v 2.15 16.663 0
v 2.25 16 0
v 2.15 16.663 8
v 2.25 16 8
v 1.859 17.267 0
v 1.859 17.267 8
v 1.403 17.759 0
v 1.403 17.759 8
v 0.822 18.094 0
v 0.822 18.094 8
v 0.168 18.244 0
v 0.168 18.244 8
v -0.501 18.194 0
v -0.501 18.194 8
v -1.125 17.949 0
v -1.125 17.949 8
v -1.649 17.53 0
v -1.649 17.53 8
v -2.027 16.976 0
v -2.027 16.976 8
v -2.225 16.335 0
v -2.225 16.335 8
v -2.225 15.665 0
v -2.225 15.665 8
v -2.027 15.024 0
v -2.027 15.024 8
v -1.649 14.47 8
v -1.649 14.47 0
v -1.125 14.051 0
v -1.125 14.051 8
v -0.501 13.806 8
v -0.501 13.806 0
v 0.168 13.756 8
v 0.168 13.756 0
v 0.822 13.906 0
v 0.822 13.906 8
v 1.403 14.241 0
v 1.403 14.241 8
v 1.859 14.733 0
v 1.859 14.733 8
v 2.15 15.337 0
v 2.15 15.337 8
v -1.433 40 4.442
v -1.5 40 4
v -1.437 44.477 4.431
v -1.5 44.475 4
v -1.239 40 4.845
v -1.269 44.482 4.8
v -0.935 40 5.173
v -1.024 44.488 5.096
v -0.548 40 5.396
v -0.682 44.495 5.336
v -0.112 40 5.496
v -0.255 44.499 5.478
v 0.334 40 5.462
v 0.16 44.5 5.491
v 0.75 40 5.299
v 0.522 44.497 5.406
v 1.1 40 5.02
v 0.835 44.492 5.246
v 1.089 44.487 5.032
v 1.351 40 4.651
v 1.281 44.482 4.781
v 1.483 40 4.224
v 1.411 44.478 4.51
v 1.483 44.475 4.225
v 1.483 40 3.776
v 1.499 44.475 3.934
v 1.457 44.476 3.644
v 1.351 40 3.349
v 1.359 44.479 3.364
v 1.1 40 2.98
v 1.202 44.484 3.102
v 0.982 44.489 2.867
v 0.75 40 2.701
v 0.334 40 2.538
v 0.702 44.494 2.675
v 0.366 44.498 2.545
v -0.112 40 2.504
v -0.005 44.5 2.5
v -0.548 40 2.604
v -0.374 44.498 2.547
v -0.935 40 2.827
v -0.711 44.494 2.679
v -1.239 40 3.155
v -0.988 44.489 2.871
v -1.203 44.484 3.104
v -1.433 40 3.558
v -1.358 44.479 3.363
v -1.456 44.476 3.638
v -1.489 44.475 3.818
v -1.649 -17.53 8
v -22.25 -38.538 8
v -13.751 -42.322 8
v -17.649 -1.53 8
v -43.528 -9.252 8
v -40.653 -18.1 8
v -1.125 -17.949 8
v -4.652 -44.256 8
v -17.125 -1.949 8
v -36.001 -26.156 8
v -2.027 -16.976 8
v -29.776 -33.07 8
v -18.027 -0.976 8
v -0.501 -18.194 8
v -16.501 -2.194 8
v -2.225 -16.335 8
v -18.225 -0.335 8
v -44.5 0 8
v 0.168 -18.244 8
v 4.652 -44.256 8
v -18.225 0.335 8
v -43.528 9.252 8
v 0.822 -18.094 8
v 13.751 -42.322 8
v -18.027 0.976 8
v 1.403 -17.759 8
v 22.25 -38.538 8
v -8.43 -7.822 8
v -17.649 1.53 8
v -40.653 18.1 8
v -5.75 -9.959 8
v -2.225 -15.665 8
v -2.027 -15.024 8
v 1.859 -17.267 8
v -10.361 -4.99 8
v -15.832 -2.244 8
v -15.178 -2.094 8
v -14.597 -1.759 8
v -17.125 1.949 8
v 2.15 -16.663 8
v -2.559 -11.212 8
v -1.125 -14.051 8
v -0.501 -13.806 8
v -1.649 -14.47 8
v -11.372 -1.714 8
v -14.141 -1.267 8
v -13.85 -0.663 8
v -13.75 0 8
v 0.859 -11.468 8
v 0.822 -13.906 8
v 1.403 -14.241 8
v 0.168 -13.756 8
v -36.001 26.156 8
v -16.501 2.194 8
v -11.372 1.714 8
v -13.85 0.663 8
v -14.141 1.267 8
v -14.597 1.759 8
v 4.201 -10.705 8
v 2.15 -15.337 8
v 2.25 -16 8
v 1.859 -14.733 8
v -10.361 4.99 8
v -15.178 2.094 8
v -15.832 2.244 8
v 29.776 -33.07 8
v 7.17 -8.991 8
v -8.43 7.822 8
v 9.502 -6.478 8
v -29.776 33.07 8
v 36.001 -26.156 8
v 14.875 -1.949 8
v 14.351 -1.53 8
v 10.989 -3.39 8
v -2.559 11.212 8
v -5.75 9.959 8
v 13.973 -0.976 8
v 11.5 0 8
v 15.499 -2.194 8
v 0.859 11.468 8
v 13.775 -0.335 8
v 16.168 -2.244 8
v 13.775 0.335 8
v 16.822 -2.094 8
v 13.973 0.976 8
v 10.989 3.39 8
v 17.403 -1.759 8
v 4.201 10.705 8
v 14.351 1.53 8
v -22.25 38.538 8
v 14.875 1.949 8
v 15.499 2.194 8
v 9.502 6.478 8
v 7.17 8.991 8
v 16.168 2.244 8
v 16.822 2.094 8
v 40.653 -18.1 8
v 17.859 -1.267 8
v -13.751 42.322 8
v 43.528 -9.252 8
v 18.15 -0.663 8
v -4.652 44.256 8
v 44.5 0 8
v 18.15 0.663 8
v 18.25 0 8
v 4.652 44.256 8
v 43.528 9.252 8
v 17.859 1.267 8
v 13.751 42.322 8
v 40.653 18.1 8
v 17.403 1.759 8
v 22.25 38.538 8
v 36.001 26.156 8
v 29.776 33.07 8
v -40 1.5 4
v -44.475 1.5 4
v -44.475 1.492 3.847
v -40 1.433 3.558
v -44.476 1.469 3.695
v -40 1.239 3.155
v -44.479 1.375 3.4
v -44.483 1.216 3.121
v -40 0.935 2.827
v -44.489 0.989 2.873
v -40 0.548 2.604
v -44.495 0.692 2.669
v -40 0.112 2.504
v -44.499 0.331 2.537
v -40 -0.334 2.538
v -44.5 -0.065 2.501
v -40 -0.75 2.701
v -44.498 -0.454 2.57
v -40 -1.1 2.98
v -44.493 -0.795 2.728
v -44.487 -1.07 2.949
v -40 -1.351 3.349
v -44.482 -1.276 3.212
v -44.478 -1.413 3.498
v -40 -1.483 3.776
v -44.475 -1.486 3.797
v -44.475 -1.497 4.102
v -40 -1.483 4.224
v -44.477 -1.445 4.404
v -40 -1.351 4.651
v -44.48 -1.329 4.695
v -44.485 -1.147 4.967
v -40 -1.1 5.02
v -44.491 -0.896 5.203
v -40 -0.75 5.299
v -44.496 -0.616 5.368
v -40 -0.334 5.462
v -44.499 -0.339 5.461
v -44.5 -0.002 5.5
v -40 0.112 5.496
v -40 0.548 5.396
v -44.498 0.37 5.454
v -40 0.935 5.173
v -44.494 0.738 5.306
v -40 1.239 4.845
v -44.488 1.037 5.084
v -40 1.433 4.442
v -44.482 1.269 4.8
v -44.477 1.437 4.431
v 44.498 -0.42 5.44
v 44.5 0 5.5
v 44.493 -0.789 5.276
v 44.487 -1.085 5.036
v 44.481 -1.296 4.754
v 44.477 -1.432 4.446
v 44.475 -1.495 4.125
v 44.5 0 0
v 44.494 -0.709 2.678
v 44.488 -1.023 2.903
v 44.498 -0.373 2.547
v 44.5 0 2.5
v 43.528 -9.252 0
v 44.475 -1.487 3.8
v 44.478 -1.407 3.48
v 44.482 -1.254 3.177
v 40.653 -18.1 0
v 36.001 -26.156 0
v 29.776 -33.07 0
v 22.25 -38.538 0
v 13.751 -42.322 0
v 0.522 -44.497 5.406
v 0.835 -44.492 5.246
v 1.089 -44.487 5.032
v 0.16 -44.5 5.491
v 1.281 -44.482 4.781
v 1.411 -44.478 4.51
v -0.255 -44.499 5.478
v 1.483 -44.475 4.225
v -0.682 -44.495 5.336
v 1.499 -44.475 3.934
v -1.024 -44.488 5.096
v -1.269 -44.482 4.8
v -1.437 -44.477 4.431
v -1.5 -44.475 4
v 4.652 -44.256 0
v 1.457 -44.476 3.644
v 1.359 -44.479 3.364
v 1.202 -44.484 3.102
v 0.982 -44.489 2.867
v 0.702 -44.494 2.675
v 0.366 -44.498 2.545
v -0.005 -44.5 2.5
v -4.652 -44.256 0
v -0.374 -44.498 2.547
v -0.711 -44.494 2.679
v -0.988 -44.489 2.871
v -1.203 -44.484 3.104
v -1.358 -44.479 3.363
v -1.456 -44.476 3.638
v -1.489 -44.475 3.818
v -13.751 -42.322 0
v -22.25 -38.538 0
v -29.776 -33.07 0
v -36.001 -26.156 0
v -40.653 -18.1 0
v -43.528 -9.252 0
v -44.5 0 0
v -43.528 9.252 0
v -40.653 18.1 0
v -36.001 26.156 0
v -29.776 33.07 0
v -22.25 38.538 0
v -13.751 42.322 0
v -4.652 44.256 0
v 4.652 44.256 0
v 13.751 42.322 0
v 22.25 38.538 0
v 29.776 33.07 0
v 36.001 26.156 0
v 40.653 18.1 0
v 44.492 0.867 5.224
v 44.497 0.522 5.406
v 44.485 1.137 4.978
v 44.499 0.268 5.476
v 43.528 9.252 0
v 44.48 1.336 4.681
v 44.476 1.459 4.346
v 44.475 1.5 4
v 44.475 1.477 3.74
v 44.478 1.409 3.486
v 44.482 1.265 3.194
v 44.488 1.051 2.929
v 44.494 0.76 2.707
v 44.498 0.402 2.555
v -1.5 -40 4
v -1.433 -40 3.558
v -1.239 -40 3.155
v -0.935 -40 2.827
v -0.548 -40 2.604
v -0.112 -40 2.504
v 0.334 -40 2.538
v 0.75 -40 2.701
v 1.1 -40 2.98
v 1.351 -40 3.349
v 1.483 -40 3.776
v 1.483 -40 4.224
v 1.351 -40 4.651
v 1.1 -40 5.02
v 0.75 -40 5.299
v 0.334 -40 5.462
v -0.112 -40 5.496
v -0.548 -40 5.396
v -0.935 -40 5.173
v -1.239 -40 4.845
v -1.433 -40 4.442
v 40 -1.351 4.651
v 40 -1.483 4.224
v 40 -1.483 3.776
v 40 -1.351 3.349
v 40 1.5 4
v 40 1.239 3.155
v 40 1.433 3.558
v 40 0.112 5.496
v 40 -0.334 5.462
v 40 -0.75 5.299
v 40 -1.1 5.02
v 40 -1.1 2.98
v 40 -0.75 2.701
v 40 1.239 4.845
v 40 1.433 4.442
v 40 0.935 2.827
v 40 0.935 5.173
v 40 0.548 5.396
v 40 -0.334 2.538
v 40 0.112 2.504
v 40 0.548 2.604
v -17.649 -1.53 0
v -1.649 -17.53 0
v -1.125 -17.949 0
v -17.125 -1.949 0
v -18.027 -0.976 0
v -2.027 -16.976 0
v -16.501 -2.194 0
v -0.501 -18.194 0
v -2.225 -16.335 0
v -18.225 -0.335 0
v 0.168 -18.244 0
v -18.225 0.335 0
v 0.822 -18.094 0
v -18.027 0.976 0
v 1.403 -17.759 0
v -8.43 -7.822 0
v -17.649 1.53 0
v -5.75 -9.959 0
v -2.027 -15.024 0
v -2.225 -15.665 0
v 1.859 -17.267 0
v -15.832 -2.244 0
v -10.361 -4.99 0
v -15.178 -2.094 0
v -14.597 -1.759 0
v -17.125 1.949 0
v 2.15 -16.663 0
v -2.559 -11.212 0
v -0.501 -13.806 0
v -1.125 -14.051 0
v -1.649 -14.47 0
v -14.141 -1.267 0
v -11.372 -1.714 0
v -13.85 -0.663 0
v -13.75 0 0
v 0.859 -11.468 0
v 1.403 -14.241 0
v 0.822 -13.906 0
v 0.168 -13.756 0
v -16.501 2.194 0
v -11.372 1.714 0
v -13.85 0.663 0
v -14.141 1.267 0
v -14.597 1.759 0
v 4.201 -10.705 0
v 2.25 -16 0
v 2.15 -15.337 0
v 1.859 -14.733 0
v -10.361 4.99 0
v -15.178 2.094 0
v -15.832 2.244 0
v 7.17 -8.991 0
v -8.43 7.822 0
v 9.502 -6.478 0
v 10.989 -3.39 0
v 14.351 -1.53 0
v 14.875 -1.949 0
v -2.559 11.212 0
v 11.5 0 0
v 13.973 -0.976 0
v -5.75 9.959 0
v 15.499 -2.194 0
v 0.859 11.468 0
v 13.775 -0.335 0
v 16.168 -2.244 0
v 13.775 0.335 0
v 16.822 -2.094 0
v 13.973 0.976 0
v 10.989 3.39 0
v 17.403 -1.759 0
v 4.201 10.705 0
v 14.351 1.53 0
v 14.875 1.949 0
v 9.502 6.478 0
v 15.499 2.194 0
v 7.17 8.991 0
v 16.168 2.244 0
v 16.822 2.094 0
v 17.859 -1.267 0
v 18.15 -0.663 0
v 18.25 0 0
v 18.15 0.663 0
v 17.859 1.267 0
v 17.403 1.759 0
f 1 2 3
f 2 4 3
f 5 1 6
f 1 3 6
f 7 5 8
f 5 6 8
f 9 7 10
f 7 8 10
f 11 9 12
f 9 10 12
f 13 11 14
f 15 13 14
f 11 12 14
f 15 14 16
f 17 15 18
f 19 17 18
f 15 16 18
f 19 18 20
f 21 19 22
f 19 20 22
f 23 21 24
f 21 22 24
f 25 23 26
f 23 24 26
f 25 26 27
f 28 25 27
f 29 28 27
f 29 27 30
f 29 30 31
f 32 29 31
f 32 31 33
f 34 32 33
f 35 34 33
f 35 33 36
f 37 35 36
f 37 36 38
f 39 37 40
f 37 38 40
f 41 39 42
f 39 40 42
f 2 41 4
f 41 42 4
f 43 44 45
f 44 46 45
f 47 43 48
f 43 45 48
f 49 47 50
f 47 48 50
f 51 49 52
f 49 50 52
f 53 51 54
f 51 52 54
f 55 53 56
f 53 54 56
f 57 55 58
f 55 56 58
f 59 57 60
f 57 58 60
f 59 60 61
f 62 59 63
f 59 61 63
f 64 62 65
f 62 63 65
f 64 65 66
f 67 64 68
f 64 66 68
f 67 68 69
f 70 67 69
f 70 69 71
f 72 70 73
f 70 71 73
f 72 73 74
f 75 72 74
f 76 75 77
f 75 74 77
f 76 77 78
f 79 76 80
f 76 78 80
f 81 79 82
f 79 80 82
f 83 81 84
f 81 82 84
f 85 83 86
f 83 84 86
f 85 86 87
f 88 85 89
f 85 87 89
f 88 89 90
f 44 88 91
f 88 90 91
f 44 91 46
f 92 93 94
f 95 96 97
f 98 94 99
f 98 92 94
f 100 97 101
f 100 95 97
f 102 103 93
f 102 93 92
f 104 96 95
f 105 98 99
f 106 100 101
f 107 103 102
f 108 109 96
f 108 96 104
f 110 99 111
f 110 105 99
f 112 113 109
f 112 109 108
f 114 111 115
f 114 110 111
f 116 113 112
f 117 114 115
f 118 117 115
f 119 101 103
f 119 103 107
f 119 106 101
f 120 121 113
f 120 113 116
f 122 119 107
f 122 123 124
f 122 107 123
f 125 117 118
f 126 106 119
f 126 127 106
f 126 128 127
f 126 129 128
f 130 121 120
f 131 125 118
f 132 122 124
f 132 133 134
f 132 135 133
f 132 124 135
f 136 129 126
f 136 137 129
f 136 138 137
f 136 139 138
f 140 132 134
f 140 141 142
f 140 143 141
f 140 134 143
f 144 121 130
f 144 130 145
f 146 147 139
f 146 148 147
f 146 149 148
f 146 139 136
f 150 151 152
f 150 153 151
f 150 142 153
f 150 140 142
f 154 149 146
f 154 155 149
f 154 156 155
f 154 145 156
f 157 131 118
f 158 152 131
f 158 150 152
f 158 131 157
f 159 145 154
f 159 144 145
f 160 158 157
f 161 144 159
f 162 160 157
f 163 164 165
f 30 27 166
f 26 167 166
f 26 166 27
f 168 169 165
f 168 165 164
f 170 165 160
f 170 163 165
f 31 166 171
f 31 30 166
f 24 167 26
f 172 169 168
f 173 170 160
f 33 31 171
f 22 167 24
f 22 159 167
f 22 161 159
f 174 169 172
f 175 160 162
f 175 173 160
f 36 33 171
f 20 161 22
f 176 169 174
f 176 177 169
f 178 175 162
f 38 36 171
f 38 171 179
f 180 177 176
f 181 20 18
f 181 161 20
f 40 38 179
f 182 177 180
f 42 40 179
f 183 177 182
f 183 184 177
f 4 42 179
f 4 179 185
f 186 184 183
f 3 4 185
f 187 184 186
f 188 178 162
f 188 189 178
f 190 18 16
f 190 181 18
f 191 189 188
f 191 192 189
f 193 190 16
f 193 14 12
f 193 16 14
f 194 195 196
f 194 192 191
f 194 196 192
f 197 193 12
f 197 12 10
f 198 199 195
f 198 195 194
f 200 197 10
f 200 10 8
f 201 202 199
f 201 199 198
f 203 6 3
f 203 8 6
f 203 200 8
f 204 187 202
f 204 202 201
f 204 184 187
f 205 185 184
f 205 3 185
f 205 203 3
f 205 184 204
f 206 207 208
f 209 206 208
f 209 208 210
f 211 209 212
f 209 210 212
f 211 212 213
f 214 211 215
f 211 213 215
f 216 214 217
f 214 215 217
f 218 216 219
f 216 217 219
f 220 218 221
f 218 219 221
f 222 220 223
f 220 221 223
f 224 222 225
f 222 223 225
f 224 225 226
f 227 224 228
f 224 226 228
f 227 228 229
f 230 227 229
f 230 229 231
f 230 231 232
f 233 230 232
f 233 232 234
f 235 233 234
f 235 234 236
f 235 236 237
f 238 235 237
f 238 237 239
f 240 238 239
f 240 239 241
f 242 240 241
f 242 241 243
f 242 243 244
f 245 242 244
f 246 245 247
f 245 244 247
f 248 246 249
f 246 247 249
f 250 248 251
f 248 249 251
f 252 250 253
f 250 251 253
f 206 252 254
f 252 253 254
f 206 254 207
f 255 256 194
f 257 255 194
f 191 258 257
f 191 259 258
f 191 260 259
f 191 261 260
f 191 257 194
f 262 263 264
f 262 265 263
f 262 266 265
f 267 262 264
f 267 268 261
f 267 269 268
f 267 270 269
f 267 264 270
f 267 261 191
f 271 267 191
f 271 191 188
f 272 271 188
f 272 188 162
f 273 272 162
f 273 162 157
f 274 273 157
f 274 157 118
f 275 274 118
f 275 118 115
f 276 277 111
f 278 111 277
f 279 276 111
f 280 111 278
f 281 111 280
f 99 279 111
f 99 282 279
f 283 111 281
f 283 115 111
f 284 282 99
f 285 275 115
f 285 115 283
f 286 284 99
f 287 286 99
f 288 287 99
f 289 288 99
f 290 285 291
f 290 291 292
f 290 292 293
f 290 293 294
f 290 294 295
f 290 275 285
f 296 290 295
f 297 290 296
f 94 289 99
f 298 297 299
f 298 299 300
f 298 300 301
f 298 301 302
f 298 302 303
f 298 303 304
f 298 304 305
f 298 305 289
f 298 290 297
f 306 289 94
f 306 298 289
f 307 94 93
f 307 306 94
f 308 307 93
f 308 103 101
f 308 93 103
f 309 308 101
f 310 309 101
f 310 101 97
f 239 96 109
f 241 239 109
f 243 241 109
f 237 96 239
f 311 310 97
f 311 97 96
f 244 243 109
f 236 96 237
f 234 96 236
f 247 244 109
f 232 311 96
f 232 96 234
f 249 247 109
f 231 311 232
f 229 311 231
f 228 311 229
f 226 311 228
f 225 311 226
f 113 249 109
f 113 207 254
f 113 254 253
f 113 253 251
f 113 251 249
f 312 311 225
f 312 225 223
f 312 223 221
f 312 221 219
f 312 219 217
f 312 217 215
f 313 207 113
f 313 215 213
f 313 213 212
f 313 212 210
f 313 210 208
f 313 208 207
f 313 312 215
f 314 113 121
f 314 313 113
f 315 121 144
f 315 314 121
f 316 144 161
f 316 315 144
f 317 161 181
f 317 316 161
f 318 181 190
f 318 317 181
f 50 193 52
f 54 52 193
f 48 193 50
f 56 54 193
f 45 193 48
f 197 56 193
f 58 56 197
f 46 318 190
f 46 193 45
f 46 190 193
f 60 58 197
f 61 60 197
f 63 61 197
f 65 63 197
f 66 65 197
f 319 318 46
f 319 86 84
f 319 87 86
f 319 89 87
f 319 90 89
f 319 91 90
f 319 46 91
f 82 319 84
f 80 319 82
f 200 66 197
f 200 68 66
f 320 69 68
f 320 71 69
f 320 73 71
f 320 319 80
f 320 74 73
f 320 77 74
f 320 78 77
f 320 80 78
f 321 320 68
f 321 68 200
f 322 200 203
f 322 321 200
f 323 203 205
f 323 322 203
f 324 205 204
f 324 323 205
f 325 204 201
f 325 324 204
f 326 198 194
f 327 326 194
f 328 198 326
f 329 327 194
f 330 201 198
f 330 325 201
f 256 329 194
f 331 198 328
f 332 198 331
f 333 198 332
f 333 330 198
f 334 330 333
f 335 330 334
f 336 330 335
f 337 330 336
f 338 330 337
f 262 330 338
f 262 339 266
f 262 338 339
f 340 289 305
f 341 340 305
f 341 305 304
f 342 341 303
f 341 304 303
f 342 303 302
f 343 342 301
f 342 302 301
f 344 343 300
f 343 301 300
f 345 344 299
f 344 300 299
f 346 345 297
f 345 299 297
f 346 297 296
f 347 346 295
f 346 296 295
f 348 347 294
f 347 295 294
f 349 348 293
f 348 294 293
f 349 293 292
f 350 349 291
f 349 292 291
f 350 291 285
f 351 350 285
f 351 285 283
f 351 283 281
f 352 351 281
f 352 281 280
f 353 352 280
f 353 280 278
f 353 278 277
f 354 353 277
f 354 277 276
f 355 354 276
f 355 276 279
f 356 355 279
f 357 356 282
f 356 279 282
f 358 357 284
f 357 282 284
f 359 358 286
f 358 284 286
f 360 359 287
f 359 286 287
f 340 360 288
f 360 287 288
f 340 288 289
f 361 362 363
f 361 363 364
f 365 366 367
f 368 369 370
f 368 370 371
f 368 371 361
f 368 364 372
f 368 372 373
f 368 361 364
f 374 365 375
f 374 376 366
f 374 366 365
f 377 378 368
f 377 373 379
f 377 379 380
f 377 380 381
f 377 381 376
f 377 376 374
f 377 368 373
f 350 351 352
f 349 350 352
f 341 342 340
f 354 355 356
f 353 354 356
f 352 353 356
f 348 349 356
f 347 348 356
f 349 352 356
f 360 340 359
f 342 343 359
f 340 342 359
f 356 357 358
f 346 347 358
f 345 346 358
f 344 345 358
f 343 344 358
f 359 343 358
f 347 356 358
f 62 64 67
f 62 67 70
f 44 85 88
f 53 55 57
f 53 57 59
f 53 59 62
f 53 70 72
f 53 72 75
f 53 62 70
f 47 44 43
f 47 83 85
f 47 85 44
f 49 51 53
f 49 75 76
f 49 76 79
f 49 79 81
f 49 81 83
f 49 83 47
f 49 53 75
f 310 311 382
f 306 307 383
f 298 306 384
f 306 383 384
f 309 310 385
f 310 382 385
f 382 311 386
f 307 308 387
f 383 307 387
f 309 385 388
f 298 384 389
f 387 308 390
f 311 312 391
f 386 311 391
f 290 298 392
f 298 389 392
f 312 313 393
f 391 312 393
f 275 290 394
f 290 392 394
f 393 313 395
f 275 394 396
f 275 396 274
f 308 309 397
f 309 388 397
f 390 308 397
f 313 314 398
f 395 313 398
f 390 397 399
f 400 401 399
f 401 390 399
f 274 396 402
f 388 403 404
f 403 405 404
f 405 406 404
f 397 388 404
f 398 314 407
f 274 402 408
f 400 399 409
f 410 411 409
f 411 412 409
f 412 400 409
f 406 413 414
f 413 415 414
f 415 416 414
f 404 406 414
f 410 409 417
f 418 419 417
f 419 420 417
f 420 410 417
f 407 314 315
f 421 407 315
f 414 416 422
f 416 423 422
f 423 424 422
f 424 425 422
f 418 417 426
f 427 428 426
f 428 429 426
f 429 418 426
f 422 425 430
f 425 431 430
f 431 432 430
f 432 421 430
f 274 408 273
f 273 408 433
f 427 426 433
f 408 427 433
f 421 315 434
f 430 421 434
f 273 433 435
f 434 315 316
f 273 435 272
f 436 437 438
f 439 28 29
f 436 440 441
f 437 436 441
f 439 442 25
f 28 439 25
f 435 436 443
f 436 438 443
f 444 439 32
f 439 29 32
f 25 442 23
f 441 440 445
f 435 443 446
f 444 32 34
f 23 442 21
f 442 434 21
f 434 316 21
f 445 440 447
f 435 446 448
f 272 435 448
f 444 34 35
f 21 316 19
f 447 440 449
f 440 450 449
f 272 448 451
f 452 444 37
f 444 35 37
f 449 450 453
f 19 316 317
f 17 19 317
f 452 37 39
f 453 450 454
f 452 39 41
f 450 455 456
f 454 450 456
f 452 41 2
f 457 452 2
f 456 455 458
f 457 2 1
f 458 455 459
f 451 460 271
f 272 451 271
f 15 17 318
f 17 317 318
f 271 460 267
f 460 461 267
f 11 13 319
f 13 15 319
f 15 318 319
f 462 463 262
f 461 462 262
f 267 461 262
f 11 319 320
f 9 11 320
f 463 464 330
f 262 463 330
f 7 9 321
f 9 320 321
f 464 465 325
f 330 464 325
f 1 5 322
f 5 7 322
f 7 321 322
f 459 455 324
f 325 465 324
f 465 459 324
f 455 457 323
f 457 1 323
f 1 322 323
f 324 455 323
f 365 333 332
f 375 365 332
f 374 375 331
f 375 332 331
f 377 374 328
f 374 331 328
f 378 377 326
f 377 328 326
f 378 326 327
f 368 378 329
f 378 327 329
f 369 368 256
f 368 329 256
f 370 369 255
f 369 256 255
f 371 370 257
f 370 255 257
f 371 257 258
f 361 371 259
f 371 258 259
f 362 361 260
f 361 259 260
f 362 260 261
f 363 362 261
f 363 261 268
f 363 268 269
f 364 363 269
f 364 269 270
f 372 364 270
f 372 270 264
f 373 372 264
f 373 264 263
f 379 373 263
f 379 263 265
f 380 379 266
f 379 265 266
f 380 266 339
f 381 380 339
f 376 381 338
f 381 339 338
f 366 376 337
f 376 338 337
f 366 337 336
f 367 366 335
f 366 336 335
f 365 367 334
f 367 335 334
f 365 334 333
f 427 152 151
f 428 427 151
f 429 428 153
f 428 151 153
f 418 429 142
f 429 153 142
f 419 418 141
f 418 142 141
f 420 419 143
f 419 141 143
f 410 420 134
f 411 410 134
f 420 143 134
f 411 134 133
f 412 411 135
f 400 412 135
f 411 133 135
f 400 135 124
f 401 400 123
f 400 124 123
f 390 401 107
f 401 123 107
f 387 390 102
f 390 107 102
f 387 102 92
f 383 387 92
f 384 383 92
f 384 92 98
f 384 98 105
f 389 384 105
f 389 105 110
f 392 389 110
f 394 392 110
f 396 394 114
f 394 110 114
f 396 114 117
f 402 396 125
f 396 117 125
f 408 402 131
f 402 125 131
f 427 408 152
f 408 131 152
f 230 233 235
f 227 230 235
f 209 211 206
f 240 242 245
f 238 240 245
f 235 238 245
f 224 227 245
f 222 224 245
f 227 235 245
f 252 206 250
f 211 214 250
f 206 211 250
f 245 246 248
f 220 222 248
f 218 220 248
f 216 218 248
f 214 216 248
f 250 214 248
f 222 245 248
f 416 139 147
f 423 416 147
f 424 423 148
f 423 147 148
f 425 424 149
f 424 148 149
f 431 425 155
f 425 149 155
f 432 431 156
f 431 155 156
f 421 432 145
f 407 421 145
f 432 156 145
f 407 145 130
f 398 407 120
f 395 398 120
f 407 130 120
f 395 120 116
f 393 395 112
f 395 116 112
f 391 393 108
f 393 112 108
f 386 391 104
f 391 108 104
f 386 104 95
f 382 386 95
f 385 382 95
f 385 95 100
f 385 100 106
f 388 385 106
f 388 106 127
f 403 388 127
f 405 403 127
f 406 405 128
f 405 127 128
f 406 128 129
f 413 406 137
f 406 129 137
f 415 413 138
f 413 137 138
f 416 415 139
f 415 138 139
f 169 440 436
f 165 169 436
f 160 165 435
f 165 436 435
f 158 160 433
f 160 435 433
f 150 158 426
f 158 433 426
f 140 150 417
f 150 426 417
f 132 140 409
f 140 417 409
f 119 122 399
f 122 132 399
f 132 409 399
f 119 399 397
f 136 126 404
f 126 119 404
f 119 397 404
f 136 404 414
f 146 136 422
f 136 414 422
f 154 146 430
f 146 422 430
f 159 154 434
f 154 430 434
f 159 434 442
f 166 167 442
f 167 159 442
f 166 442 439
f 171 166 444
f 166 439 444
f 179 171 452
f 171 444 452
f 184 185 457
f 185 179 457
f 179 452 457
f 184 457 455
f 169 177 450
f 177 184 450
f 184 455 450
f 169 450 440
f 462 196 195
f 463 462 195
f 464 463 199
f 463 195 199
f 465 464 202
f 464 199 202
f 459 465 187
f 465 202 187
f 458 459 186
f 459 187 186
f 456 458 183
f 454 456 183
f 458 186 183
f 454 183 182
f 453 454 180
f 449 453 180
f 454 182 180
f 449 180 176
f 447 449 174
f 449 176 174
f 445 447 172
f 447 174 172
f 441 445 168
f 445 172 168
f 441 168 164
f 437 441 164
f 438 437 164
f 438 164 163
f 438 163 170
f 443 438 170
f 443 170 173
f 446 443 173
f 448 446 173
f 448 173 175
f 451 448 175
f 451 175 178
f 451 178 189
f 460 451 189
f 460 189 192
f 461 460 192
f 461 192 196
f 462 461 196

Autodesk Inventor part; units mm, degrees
sketch "スケッチ1" plane through (0, 0, 0) normal (0, 0, 1) x (1, 0, 0)
  circle A0 centre (0, 0) radius 44.5
  circle A1 centre (0, 0) radius 11.5
  dimension "d0" = 89
  dimension "d1" = 23
extrude "押し出し1" add sketch "スケッチ1" along normal blind 8
sketch "スケッチ2" plane through (0, 0, 8) normal (0, 0, 1) x (1, 0, 0)
  line L0 (0, 0) -> (0, 16) construction
  circle A0 centre (0, 16) radius 2.25
  circle A1 centre (-16, 0) radius 2.25
  circle A2 centre (0, -16) radius 2.25
  circle A3 centre (16, 0) radius 2.25
  dimension "d4" = 16
  dimension "d5" = 4.5
  dimension "d8" = 360
extrude "押し出し2" cut sketch "スケッチ2" against normal blind 8
ref_plane "作業平面1" through (45, 0, 0) normal (1, 0, 0) x (0, 1, 0)
sketch "スケッチ3" plane through (45, 0, 0) normal (1, 0, 0) x (0, 1, 0)
  line L0 (0, 0) -> (0, 4) construction
  circle A0 centre (0, 4) radius 1.5
  dimension "d13" = 4
  dimension "d14" = 3
extrude "押し出し3" cut sketch "スケッチ3" against normal blind 5
ref_plane "作業平面2" through (-45, 0, 0) normal (1, 0, 0) x (0, 1, 0)
sketch "スケッチ4" plane through (-45, 0, 0) normal (1, 0, 0) x (0, 1, 0)
  line L0 (0, 0) -> (0, 4) construction
  circle A0 centre (0, 4) radius 1.5
  dimension "d20" = 4
  dimension "d21" = 3
extrude "押し出し4" cut sketch "スケッチ4" along normal blind 5
ref_plane "作業平面3" through (0, 45, 0) normal (0, 1, 0) x (-1, 0, 0)
sketch "スケッチ5" plane through (0, 45, 0) normal (0, 1, 0) x (-1, 0, 0)
  line L0 (0, 0) -> (0, 4) construction
  circle A0 centre (0, 4) radius 1.5
  dimension "d25" = 4
  dimension "d26" = 3
extrude "押し出し5" cut sketch "スケッチ5" against normal blind 5
ref_plane "作業平面4" through (0, -45, 0) normal (0, 1, 0) x (-1, 0, 0)
sketch "スケッチ6" plane through (0, -45, 0) normal (0, 1, 0) x (-1, 0, 0)
  line L0 (0, 0) -> (0, 4) construction
  circle A0 centre (0, 4) radius 1.5
  dimension "d30" = 4
  dimension "d31" = 3
extrude "押し出し6" cut sketch "スケッチ6" along normal blind 5
thread "ねじ2" size "M3x0.5" class "6H" standard "ANSI Metric M Profile" full length
thread "ねじ3" size "M3x0.5" class "6H" standard "ANSI Metric M Profile" full length
thread "ねじ4" size "M3x0.5" class "6H" standard "ANSI Metric M Profile" full length
thread "ねじ5" size "M3x0.5" class "6H" standard "ANSI Metric M Profile" full length
properties part number "Bottom1"
